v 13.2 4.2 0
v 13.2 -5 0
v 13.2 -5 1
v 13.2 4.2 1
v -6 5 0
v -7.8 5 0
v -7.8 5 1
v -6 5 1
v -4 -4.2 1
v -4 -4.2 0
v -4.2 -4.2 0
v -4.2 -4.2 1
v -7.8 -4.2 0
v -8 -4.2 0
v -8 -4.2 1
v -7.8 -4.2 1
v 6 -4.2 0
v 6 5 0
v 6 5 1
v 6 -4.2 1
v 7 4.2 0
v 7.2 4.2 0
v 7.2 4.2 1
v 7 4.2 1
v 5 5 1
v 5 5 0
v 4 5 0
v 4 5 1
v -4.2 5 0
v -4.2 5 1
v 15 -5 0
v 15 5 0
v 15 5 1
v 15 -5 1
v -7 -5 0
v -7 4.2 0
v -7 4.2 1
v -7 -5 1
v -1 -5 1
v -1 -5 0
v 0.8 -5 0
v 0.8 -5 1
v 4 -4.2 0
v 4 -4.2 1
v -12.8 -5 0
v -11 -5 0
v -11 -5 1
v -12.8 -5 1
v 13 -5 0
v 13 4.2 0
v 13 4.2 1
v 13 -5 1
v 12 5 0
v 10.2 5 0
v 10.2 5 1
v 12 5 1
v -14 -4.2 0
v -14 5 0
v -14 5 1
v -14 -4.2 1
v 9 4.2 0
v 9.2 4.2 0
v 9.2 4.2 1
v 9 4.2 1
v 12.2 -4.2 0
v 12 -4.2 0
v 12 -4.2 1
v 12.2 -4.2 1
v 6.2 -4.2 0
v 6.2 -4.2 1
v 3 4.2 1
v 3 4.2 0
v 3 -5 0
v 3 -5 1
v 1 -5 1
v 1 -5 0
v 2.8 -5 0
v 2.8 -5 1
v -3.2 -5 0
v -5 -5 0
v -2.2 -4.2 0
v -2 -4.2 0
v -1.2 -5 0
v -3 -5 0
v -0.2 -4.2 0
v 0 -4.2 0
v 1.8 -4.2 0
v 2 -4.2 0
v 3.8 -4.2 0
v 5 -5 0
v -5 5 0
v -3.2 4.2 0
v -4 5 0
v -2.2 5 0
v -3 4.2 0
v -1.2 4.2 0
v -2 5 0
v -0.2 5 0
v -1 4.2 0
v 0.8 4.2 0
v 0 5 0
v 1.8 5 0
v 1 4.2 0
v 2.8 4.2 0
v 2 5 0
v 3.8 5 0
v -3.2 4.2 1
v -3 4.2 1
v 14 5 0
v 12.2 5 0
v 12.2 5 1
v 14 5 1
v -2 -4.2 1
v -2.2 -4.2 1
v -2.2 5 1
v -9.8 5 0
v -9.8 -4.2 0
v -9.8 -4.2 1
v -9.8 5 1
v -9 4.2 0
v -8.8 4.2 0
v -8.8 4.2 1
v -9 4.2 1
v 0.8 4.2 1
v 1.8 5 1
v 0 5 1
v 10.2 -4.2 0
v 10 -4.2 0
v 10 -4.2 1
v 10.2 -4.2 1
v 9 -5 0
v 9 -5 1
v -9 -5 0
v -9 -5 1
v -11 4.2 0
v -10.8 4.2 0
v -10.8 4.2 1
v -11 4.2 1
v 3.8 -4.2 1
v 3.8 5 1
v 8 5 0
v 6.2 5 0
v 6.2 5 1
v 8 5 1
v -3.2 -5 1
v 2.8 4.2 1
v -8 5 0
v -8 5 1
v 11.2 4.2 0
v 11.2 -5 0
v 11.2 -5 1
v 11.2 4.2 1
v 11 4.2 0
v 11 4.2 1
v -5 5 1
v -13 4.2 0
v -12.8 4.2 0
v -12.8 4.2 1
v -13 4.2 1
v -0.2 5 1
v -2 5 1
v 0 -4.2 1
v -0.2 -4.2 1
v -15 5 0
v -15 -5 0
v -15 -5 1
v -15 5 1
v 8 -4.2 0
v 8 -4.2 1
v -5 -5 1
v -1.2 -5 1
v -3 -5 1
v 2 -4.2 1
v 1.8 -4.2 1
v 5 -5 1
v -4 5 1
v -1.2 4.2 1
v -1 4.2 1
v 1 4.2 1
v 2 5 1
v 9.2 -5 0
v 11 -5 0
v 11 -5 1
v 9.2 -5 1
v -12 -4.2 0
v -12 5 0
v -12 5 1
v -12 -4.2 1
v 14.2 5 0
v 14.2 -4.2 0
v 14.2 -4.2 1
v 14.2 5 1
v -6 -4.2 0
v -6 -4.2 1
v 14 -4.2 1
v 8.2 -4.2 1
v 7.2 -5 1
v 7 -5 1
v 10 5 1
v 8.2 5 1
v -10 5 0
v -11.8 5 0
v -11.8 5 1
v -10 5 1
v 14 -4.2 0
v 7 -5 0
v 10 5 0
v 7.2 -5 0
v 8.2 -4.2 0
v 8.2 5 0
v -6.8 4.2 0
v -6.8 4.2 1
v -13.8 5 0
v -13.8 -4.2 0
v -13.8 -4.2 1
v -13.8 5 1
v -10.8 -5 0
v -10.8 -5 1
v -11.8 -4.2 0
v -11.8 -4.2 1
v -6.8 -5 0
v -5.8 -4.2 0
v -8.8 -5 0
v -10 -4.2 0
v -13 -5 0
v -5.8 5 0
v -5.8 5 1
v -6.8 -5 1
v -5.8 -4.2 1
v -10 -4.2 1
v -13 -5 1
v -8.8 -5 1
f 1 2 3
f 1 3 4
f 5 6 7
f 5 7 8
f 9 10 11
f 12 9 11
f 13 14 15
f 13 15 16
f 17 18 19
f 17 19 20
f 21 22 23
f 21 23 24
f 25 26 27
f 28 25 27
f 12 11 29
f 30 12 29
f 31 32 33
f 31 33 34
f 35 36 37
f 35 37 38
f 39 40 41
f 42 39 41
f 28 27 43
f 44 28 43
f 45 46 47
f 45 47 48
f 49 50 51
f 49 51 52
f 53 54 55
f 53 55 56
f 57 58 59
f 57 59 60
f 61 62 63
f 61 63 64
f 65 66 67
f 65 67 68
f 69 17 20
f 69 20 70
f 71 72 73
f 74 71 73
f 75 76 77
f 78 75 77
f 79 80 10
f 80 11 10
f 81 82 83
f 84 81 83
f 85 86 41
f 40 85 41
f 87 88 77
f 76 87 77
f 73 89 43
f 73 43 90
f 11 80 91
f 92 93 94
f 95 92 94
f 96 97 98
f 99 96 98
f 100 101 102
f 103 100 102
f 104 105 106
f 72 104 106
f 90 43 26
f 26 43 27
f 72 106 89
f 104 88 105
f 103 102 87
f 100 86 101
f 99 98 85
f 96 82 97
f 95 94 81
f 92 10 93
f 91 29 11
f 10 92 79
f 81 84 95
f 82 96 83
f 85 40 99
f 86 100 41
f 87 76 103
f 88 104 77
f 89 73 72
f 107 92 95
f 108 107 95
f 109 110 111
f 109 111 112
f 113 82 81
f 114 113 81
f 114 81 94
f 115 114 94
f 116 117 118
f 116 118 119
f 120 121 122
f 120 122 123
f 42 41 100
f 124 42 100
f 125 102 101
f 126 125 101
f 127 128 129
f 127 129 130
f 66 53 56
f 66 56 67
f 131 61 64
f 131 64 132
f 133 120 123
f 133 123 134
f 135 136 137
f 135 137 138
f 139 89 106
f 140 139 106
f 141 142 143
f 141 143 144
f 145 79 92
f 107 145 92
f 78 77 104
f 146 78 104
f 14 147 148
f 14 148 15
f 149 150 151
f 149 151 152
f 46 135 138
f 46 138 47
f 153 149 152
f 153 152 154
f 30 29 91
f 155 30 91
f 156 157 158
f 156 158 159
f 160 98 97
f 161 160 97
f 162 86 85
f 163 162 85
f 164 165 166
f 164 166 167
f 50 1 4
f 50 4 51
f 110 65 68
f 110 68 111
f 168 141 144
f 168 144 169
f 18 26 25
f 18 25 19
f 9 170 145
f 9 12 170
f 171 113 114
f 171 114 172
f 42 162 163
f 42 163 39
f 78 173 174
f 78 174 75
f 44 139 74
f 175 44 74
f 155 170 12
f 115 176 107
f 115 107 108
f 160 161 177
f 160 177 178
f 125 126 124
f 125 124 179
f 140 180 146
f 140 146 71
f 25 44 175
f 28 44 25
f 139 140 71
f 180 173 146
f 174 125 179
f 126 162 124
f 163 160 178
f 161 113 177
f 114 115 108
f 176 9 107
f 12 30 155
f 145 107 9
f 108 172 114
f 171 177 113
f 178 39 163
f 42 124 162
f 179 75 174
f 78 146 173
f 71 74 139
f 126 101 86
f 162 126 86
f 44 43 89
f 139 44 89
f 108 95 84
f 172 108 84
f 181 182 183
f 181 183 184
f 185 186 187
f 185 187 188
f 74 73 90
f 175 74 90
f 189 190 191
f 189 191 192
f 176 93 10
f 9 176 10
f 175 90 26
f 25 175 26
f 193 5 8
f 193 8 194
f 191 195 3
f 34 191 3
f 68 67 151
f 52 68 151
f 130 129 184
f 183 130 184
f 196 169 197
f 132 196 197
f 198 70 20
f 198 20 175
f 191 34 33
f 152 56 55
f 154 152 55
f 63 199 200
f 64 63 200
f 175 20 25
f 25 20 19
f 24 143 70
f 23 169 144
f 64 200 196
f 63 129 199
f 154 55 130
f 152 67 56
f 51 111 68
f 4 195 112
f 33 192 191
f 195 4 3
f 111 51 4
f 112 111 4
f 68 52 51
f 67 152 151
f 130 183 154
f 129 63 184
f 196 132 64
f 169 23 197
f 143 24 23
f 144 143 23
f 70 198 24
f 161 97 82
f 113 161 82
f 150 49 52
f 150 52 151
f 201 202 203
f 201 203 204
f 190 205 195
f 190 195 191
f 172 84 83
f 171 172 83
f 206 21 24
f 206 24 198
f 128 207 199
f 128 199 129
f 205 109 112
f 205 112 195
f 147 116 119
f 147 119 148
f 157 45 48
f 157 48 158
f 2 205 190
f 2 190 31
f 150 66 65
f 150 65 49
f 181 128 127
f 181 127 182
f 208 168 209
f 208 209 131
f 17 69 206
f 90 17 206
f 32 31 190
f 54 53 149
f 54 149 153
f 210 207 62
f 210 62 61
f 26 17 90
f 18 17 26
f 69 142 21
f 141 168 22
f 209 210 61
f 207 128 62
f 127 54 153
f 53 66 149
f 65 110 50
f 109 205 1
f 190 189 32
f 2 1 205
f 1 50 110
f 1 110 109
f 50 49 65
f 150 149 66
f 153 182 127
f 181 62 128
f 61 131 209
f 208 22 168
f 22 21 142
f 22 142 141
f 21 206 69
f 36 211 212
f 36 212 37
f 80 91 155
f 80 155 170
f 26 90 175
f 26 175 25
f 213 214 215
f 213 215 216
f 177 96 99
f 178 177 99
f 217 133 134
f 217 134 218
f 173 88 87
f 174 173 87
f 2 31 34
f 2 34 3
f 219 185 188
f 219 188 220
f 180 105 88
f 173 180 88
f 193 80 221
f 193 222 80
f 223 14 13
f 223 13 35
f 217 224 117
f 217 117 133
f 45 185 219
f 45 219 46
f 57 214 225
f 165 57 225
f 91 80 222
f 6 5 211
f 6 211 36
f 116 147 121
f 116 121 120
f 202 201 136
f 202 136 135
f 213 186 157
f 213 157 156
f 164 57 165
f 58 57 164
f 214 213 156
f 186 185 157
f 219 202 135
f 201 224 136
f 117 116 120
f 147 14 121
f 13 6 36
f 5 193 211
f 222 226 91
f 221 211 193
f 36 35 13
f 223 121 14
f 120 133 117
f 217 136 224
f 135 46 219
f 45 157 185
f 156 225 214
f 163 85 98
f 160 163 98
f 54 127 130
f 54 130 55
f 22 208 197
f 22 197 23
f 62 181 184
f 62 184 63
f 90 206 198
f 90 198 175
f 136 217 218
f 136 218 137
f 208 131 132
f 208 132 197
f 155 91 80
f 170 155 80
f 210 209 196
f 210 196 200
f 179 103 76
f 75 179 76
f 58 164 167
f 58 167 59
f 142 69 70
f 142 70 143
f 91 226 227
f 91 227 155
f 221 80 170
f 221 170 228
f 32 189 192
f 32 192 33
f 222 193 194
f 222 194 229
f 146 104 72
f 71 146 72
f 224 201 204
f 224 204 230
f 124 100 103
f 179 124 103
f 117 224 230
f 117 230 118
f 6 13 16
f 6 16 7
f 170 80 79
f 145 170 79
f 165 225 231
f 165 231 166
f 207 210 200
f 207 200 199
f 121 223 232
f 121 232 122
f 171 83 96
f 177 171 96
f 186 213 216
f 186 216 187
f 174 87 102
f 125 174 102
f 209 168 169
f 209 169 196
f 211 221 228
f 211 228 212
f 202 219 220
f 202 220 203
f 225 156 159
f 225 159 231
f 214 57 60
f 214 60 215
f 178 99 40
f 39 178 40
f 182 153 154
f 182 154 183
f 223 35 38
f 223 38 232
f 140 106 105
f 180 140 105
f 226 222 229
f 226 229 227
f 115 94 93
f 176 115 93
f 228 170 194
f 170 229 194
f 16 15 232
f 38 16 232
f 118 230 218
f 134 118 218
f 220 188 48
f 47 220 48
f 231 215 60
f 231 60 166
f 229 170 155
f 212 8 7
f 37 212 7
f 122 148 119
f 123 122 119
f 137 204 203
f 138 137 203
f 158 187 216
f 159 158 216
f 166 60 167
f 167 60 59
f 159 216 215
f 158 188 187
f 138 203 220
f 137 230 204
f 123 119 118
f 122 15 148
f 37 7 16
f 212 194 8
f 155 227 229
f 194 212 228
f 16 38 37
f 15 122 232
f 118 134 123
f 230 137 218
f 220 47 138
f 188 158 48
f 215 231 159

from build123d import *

# Parameters (mm, degrees)
F1_DEPTH = 1


with BuildPart() as f1:
    # F0 (on Top) → F1 (new body)
    with BuildSketch(Plane.XY):
        Polygon((5, -5), (5, 5), (4, 5), (4, -4.2), (3.8, -4.2), (3.8, 5), (2, 5), (2, -4.2), (1.8, -4.2), (1.8, 5), (0.888324, 5), (0, 5), (0, -4.2), (-0.2, -4.2), (-0.2, 5), (-2, 5), (-2, -4.2), (-2.2, -4.2), (-2.2, 5), (-4, 5), (-4, -4.2), (-4.2, -4.2), (-4.2, 5), (-5, 5), (-5, -5), (-3.2, -5), (-3.2, 4.2), (-3, 4.2), (-3, -5), (-1.2, -5), (-1.2, 4.2), (-1, 4.2), (-1, -5), (0.8, -5), (0.8, 4.2), (1, 4.2), (1, -5), (2.8, -5), (2.8, 4.2), (3, 4.2), (3, -5), align=None)
    extrude(amount=F1_DEPTH)


with BuildPart() as f2_1:
    # F2: instance of F1
    add(f1.part.mirror(Plane(origin=(5, 0, 0.5), x_dir=(0, 1, 0), z_dir=(1, 0, 0))))


with BuildPart() as f3_1:
    # F3: instance of F1
    add(f1.part.mirror(Plane(origin=(-5, 0, 0.5), x_dir=(0, -1, 0), z_dir=(-1, 0, 0))))


solid = Compound([f1.part, f2_1.part, f3_1.part])
